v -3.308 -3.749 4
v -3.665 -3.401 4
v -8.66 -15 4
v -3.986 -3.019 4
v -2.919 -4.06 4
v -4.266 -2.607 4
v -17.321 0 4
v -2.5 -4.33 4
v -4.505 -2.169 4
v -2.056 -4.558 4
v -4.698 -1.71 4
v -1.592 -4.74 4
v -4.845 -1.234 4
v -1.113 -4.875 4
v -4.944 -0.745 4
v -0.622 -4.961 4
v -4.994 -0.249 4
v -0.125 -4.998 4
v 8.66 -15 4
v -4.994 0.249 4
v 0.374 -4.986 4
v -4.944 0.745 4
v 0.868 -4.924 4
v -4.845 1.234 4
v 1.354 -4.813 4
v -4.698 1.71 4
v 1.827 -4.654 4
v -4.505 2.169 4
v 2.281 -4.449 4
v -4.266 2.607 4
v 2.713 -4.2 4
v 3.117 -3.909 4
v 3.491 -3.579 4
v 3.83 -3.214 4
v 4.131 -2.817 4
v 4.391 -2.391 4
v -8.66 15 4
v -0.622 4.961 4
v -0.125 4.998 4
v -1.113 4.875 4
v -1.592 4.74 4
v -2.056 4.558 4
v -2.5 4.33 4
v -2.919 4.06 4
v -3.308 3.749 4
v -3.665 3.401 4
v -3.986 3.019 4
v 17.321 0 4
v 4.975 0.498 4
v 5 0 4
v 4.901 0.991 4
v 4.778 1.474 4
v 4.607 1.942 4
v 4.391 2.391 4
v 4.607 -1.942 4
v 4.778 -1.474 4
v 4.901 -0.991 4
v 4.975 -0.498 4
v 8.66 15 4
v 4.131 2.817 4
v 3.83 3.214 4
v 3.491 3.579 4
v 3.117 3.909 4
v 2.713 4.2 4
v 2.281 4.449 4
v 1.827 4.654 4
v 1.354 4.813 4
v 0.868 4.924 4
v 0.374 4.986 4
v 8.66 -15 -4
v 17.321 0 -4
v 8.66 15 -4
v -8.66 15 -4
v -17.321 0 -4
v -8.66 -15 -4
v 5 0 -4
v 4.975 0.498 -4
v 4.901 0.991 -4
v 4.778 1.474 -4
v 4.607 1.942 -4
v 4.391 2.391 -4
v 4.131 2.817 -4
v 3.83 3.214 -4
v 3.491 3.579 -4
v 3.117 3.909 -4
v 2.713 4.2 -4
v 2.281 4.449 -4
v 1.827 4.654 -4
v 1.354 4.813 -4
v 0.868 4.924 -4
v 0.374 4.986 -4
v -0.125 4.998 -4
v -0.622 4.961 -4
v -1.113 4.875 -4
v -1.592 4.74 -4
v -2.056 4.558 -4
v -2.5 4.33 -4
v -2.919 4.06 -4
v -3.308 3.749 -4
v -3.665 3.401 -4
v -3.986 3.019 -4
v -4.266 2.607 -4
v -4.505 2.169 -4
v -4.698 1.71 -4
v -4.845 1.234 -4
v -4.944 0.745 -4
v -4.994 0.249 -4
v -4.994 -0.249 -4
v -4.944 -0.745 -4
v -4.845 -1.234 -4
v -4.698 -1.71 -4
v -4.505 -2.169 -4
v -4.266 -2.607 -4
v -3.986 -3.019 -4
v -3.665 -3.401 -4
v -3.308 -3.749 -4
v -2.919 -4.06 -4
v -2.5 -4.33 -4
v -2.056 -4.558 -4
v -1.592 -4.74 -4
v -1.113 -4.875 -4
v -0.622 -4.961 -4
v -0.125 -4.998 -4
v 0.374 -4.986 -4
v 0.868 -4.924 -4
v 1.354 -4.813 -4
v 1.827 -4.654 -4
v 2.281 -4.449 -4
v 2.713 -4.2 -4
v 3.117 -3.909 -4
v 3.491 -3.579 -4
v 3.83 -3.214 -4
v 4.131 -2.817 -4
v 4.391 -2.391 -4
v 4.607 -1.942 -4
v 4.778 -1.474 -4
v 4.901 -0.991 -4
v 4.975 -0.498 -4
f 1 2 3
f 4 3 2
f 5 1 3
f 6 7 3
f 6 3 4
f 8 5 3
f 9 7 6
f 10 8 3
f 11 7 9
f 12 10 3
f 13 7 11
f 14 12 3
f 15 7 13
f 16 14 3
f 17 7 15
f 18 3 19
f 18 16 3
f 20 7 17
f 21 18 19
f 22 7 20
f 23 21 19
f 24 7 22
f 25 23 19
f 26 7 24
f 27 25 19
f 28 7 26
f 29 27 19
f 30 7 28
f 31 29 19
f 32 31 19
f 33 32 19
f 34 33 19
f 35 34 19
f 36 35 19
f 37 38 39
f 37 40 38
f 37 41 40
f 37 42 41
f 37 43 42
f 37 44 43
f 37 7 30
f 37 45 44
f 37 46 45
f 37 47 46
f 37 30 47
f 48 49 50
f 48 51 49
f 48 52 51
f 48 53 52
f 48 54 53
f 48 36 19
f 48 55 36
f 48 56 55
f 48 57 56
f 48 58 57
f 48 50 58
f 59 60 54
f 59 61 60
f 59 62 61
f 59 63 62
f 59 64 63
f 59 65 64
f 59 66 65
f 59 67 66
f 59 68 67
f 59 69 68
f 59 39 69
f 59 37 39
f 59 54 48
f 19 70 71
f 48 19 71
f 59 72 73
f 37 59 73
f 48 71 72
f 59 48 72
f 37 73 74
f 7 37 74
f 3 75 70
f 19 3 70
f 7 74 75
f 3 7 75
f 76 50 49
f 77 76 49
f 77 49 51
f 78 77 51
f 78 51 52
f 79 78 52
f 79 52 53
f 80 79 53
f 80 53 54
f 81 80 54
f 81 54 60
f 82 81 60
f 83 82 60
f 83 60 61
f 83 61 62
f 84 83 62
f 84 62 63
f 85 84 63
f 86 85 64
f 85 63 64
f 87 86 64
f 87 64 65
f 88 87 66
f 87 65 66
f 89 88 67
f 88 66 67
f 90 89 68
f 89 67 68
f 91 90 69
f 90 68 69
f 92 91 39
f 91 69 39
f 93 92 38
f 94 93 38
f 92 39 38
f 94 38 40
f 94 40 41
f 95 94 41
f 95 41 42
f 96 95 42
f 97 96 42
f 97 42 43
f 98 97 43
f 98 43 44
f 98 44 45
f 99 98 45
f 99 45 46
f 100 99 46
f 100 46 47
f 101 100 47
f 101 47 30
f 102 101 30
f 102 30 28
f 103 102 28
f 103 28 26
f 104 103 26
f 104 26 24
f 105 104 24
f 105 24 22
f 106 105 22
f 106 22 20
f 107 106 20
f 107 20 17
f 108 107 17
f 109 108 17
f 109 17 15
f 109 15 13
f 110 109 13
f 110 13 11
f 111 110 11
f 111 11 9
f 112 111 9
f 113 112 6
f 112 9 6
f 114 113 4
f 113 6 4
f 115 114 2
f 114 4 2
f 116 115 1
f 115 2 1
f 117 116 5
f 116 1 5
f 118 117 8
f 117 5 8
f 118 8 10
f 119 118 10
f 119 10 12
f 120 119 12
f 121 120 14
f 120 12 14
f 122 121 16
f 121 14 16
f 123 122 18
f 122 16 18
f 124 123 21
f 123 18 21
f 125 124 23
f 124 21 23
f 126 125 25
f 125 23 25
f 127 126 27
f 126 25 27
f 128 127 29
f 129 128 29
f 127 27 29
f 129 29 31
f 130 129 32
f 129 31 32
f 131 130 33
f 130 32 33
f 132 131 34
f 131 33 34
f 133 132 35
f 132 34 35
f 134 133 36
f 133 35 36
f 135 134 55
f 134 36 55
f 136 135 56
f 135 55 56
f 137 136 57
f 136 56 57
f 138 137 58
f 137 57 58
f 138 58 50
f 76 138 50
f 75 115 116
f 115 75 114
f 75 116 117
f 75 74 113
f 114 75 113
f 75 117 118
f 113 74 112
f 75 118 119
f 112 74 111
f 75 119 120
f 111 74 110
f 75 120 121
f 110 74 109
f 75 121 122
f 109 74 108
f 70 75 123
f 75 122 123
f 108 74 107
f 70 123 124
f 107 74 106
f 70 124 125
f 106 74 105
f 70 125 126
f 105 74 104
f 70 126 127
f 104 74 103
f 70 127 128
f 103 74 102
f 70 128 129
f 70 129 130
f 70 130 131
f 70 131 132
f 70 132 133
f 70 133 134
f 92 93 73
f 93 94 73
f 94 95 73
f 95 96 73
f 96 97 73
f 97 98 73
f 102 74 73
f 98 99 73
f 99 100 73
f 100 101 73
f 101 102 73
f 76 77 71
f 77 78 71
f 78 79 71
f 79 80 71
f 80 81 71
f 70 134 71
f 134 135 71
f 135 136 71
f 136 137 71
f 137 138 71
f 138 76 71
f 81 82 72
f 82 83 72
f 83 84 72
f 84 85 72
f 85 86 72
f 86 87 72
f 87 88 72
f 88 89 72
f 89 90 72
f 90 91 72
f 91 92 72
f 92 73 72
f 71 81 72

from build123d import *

# Parameters (mm, degrees)
EXTRUDE_START       = -4
EXTRUDE_1_DEPTH     = 8
SKETCH_2_R          = 5
CUT_EXTRUDE_1_DEPTH = 25.269322199


# Read off the part's stored shape, not the designer's step: 凸台-拉伸1
with BuildPart() as part:
    # 凸台-拉伸1 outline → 凸台-拉伸1 (new body)
    with BuildSketch(Plane.XY.offset(EXTRUDE_START)):
        Polygon((8.660254038, -15), (17.320508076, 0), (8.660254038, 15), (-8.660254038, 15), (-17.320508076, 0), (-8.660254038, -15), align=None)
    extrude(amount=EXTRUDE_1_DEPTH)

    # 草图2 → 切除-拉伸1 (cut, through all)
    with BuildSketch(Plane.XY.offset(4)):
        Circle(SKETCH_2_R)
    extrude(amount=-CUT_EXTRUDE_1_DEPTH, mode=Mode.SUBTRACT)


solid = part.part
